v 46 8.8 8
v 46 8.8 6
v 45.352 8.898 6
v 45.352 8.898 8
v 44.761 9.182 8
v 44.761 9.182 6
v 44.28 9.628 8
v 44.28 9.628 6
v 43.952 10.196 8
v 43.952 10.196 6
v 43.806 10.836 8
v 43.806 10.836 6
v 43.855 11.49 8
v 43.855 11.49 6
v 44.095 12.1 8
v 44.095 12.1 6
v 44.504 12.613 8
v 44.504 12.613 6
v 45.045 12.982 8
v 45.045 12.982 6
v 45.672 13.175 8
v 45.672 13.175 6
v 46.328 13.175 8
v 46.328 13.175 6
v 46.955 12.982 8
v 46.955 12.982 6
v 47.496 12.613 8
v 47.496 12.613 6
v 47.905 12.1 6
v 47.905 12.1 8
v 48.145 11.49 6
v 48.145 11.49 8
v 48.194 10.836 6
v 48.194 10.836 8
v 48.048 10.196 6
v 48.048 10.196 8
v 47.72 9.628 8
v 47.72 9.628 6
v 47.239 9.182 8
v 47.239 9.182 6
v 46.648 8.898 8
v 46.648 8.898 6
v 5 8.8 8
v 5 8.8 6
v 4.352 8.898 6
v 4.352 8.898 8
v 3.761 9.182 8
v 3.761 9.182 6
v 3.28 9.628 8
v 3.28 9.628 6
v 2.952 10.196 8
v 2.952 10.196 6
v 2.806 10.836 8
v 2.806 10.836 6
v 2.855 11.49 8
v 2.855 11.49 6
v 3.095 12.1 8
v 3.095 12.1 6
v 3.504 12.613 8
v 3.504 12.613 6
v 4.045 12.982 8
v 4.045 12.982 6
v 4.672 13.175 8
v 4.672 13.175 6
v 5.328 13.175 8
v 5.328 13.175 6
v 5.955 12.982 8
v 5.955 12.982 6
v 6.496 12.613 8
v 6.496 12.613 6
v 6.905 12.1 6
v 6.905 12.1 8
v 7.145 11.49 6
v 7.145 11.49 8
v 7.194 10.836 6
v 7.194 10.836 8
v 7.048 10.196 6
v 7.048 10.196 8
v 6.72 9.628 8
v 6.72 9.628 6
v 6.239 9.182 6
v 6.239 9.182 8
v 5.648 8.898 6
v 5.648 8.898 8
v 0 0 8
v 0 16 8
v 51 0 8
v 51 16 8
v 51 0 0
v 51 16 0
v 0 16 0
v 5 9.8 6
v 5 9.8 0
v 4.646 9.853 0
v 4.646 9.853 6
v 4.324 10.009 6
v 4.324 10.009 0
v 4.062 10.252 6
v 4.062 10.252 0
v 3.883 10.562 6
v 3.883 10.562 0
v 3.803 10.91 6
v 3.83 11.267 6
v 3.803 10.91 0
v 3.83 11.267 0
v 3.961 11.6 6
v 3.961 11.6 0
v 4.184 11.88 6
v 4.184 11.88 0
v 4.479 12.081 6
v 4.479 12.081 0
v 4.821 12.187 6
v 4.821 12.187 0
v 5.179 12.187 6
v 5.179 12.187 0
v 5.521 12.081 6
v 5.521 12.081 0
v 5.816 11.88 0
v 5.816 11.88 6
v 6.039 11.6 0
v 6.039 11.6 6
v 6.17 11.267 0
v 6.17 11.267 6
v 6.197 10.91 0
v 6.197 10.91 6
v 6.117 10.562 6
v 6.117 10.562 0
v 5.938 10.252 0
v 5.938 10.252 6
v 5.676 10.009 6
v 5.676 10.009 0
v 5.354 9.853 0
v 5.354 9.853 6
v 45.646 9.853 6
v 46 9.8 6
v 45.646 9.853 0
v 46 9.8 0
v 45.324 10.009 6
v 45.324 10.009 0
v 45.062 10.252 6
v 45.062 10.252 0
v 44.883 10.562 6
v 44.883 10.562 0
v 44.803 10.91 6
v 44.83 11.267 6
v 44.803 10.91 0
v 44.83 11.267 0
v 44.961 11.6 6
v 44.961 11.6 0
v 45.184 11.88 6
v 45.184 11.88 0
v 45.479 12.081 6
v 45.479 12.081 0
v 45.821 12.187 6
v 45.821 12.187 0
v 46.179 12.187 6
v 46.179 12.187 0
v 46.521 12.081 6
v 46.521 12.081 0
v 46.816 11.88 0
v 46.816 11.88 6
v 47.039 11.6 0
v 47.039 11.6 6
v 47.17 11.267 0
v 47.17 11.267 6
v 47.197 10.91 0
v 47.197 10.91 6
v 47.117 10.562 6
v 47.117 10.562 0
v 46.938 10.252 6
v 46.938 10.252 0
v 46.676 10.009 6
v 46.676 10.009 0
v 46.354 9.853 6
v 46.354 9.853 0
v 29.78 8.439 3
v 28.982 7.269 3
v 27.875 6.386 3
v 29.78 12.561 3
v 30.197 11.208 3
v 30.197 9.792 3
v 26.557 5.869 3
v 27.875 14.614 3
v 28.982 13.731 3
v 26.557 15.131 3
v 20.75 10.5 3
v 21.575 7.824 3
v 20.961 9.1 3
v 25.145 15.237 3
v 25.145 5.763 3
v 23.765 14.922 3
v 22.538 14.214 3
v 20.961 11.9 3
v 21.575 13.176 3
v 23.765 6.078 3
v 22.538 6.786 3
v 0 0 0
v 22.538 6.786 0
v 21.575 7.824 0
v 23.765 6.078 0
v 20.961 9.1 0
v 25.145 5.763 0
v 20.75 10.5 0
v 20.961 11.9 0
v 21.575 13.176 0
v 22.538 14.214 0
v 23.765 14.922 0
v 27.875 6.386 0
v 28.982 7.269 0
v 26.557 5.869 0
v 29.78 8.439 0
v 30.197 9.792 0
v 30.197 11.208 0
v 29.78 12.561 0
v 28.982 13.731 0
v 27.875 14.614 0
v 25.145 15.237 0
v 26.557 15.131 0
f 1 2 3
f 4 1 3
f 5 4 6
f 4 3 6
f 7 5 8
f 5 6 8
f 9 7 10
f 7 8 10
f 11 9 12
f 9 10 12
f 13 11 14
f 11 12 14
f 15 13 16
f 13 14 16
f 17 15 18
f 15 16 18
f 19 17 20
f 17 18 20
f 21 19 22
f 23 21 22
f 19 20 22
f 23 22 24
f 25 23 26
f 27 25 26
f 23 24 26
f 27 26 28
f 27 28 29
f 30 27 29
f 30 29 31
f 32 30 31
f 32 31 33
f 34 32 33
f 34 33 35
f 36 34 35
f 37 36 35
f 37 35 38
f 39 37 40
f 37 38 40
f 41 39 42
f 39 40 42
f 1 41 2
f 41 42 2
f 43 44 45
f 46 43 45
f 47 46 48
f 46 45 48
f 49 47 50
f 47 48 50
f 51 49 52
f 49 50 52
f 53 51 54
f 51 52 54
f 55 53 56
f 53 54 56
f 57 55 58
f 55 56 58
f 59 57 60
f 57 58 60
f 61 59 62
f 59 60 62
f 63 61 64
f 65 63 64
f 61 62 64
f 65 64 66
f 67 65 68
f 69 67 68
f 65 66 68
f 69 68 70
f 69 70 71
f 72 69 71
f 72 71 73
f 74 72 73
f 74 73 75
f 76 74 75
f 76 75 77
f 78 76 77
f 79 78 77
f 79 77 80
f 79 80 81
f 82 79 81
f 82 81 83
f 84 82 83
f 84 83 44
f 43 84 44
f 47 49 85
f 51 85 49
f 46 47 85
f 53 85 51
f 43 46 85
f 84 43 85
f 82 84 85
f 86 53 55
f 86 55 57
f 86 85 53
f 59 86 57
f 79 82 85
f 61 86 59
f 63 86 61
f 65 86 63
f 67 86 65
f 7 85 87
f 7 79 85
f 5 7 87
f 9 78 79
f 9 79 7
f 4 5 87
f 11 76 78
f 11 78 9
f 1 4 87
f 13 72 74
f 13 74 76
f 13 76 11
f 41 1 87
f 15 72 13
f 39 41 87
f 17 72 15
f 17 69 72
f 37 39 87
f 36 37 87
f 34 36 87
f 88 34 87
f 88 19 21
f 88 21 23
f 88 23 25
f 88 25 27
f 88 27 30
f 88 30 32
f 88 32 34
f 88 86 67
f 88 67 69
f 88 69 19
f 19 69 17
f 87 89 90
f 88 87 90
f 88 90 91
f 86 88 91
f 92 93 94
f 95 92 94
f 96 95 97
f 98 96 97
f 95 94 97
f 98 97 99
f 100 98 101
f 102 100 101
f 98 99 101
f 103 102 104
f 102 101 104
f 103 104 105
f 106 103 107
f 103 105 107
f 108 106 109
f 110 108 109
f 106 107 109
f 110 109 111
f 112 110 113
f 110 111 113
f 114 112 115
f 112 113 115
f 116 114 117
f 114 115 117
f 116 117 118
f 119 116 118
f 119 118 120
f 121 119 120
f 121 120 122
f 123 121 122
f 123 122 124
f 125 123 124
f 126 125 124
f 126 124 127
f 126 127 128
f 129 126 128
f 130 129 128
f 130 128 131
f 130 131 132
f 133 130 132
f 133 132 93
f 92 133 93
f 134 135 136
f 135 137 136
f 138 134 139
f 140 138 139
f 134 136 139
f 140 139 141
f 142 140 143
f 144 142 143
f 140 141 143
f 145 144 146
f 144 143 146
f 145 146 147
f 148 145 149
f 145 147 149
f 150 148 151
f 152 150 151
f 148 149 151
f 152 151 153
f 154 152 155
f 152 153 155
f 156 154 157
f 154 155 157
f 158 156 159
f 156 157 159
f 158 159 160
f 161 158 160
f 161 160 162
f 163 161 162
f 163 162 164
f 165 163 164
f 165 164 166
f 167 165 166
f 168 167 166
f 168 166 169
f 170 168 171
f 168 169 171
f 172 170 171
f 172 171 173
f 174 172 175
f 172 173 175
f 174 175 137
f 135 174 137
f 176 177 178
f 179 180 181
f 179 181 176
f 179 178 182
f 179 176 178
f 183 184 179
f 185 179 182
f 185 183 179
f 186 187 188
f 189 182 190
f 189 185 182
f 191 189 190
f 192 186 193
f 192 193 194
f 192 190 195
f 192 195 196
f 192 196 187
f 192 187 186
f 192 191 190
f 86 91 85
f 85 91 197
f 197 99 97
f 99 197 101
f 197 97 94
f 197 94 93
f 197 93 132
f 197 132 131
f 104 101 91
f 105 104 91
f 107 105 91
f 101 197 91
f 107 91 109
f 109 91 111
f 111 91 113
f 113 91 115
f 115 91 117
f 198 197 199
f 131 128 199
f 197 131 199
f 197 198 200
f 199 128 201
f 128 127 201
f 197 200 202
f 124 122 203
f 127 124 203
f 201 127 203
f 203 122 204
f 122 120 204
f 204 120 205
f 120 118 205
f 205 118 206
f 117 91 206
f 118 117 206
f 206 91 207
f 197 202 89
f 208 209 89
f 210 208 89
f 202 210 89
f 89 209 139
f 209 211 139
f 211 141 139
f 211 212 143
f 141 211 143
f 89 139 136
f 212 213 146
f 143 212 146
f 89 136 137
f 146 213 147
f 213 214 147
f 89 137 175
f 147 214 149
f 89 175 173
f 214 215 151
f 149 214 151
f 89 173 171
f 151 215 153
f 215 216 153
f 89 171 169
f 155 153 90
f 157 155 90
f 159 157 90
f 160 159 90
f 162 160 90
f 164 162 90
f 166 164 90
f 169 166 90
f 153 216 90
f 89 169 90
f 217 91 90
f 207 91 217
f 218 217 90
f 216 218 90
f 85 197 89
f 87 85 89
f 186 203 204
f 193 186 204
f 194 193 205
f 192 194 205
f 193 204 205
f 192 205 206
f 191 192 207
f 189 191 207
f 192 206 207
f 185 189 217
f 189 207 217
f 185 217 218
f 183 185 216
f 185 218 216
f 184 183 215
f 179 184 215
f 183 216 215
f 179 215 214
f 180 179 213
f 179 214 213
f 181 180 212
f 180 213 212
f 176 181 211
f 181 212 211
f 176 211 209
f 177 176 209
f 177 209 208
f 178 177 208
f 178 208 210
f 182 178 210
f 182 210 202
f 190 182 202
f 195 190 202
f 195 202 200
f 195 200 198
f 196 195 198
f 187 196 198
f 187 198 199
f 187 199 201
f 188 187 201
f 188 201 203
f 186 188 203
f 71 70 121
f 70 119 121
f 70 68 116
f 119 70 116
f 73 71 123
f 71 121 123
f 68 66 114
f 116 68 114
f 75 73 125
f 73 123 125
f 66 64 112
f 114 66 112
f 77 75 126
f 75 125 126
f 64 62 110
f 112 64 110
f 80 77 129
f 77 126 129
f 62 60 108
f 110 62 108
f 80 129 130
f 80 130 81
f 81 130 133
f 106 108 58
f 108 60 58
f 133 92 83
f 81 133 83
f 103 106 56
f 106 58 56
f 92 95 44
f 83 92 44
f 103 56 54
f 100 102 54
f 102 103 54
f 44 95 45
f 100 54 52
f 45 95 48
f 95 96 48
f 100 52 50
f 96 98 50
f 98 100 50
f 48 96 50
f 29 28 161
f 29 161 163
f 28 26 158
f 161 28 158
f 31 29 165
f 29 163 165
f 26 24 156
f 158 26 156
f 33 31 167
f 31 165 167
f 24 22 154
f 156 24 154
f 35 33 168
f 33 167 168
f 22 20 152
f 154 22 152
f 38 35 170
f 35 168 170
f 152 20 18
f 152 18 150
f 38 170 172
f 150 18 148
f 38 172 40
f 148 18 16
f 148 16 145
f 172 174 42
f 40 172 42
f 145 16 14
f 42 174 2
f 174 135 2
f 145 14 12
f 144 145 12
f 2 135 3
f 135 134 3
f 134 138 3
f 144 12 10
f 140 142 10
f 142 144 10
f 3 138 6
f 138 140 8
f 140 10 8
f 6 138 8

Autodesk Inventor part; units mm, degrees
ref_plane "YZ Plane" through (0, 0, 0) normal (1, 0, 0) x (0, 1, 0)
ref_plane "XZ Plane" through (0, 0, 0) normal (0, 1, 0) x (-1, 0, 0)
ref_plane "XY Plane" through (0, 0, 0) normal (0, 0, 1) x (1, 0, 0)
sketch "Sketch1" plane through (0, 0, 0) normal (0, 0, 1) x (1, 0, 0)
  line L0 (0, 0) -> (51, 0)
  line L1 (51, 0) -> (51, 16)
  line L2 (51, 16) -> (0, 16)
  line L3 (0, 16) -> (0, 0)
  line L4 (25.5, 0) -> (25.5, 7.5) construction
  line L5 (25.5, 0) -> (25.5, 10.5) construction
  circle A0 centre (25.5, 10.5) radius 4
  dimension "d0" = 51
  dimension "d1" = 16
  dimension "d4" = 10.5
  dimension "d8" = 8
extrude "Extrusion1" add sketch "Sketch1" along normal blind 8 contours L3 L2 L1 L0 | A0
sketch "Sketch2" plane through (0, 0, 0) normal (0, 0, -1) x (-1, 0, 0)
  line L0 (0, 0) -> (-51, 0) construction
  line L1 (-25.5, 0) -> (-25.5, 10.5) construction
  circle A0 centre (-25.5, 10.5) radius 4.75
  line L2 (-25.5, 0) -> (-15.5, 0) construction
  line L3 (-15.5, 0) -> (-15.5, 10.5) construction
  line L4 (-25.5, 0) -> (-35.5, 0) construction
  line L5 (-35.5, 0) -> (-35.5, 10.5) construction
  circle A1 centre (-35.5, 10.5) radius 3
  circle A2 centre (-15.5, 10.5) radius 3
  dimension "d6" = 10.5
  dimension "d7" = 9.5
  dimension "d11" = 10
  dimension "d12" = 10.5
  dimension "d13" = 10
  dimension "d14" = 10.5
  dimension "d15" = 6
  dimension "d16" = 6
extrude "Extrusion2" cut sketch "Sketch2" against normal blind 3 contours A0
sketch "Sketch3" plane through (0, 0, 8) normal (0, 0, 1) x (1, 0, 0)
  line L0 (51, 16) -> (0, 16) construction
  line L1 (0, 16) -> (5, 16) construction
  line L2 (5, 16) -> (5, 11) construction
  point P0 (0, 0)
  dimension "d17" = 5
  dimension "d18" = 5
sketch "Sketch4" plane through (0, 0, 8) normal (0, 0, 1) x (1, 0, 0)
  line L0 (51, 16) -> (0, 16) projected
  line L1 (0, 16) -> (0, 11)
  line L2 (0, 16) -> (0, 0) projected
  line L3 (0, 11) -> (5, 11)
  line L4 (51, 16) -> (46, 16)
  line L5 (46, 16) -> (46, 11)
  dimension "d19" = 5
  dimension "d20" = 5
  dimension "d21" = 5
  dimension "d22" = 5
hole "Hole1" at (5, 11, 8) at (46, 11, 8) direction (0, 0, -1) diameter 2.4 end through all counterbore diameter 4.4 counterbore depth 2
sketch "Sketch5" plane through (0, 0, 8) normal (0, 0, 1) x (1, 0, 0)
  point P0 (0, 0)
properties part number "Back Plate" material "Steel, Carbon"
